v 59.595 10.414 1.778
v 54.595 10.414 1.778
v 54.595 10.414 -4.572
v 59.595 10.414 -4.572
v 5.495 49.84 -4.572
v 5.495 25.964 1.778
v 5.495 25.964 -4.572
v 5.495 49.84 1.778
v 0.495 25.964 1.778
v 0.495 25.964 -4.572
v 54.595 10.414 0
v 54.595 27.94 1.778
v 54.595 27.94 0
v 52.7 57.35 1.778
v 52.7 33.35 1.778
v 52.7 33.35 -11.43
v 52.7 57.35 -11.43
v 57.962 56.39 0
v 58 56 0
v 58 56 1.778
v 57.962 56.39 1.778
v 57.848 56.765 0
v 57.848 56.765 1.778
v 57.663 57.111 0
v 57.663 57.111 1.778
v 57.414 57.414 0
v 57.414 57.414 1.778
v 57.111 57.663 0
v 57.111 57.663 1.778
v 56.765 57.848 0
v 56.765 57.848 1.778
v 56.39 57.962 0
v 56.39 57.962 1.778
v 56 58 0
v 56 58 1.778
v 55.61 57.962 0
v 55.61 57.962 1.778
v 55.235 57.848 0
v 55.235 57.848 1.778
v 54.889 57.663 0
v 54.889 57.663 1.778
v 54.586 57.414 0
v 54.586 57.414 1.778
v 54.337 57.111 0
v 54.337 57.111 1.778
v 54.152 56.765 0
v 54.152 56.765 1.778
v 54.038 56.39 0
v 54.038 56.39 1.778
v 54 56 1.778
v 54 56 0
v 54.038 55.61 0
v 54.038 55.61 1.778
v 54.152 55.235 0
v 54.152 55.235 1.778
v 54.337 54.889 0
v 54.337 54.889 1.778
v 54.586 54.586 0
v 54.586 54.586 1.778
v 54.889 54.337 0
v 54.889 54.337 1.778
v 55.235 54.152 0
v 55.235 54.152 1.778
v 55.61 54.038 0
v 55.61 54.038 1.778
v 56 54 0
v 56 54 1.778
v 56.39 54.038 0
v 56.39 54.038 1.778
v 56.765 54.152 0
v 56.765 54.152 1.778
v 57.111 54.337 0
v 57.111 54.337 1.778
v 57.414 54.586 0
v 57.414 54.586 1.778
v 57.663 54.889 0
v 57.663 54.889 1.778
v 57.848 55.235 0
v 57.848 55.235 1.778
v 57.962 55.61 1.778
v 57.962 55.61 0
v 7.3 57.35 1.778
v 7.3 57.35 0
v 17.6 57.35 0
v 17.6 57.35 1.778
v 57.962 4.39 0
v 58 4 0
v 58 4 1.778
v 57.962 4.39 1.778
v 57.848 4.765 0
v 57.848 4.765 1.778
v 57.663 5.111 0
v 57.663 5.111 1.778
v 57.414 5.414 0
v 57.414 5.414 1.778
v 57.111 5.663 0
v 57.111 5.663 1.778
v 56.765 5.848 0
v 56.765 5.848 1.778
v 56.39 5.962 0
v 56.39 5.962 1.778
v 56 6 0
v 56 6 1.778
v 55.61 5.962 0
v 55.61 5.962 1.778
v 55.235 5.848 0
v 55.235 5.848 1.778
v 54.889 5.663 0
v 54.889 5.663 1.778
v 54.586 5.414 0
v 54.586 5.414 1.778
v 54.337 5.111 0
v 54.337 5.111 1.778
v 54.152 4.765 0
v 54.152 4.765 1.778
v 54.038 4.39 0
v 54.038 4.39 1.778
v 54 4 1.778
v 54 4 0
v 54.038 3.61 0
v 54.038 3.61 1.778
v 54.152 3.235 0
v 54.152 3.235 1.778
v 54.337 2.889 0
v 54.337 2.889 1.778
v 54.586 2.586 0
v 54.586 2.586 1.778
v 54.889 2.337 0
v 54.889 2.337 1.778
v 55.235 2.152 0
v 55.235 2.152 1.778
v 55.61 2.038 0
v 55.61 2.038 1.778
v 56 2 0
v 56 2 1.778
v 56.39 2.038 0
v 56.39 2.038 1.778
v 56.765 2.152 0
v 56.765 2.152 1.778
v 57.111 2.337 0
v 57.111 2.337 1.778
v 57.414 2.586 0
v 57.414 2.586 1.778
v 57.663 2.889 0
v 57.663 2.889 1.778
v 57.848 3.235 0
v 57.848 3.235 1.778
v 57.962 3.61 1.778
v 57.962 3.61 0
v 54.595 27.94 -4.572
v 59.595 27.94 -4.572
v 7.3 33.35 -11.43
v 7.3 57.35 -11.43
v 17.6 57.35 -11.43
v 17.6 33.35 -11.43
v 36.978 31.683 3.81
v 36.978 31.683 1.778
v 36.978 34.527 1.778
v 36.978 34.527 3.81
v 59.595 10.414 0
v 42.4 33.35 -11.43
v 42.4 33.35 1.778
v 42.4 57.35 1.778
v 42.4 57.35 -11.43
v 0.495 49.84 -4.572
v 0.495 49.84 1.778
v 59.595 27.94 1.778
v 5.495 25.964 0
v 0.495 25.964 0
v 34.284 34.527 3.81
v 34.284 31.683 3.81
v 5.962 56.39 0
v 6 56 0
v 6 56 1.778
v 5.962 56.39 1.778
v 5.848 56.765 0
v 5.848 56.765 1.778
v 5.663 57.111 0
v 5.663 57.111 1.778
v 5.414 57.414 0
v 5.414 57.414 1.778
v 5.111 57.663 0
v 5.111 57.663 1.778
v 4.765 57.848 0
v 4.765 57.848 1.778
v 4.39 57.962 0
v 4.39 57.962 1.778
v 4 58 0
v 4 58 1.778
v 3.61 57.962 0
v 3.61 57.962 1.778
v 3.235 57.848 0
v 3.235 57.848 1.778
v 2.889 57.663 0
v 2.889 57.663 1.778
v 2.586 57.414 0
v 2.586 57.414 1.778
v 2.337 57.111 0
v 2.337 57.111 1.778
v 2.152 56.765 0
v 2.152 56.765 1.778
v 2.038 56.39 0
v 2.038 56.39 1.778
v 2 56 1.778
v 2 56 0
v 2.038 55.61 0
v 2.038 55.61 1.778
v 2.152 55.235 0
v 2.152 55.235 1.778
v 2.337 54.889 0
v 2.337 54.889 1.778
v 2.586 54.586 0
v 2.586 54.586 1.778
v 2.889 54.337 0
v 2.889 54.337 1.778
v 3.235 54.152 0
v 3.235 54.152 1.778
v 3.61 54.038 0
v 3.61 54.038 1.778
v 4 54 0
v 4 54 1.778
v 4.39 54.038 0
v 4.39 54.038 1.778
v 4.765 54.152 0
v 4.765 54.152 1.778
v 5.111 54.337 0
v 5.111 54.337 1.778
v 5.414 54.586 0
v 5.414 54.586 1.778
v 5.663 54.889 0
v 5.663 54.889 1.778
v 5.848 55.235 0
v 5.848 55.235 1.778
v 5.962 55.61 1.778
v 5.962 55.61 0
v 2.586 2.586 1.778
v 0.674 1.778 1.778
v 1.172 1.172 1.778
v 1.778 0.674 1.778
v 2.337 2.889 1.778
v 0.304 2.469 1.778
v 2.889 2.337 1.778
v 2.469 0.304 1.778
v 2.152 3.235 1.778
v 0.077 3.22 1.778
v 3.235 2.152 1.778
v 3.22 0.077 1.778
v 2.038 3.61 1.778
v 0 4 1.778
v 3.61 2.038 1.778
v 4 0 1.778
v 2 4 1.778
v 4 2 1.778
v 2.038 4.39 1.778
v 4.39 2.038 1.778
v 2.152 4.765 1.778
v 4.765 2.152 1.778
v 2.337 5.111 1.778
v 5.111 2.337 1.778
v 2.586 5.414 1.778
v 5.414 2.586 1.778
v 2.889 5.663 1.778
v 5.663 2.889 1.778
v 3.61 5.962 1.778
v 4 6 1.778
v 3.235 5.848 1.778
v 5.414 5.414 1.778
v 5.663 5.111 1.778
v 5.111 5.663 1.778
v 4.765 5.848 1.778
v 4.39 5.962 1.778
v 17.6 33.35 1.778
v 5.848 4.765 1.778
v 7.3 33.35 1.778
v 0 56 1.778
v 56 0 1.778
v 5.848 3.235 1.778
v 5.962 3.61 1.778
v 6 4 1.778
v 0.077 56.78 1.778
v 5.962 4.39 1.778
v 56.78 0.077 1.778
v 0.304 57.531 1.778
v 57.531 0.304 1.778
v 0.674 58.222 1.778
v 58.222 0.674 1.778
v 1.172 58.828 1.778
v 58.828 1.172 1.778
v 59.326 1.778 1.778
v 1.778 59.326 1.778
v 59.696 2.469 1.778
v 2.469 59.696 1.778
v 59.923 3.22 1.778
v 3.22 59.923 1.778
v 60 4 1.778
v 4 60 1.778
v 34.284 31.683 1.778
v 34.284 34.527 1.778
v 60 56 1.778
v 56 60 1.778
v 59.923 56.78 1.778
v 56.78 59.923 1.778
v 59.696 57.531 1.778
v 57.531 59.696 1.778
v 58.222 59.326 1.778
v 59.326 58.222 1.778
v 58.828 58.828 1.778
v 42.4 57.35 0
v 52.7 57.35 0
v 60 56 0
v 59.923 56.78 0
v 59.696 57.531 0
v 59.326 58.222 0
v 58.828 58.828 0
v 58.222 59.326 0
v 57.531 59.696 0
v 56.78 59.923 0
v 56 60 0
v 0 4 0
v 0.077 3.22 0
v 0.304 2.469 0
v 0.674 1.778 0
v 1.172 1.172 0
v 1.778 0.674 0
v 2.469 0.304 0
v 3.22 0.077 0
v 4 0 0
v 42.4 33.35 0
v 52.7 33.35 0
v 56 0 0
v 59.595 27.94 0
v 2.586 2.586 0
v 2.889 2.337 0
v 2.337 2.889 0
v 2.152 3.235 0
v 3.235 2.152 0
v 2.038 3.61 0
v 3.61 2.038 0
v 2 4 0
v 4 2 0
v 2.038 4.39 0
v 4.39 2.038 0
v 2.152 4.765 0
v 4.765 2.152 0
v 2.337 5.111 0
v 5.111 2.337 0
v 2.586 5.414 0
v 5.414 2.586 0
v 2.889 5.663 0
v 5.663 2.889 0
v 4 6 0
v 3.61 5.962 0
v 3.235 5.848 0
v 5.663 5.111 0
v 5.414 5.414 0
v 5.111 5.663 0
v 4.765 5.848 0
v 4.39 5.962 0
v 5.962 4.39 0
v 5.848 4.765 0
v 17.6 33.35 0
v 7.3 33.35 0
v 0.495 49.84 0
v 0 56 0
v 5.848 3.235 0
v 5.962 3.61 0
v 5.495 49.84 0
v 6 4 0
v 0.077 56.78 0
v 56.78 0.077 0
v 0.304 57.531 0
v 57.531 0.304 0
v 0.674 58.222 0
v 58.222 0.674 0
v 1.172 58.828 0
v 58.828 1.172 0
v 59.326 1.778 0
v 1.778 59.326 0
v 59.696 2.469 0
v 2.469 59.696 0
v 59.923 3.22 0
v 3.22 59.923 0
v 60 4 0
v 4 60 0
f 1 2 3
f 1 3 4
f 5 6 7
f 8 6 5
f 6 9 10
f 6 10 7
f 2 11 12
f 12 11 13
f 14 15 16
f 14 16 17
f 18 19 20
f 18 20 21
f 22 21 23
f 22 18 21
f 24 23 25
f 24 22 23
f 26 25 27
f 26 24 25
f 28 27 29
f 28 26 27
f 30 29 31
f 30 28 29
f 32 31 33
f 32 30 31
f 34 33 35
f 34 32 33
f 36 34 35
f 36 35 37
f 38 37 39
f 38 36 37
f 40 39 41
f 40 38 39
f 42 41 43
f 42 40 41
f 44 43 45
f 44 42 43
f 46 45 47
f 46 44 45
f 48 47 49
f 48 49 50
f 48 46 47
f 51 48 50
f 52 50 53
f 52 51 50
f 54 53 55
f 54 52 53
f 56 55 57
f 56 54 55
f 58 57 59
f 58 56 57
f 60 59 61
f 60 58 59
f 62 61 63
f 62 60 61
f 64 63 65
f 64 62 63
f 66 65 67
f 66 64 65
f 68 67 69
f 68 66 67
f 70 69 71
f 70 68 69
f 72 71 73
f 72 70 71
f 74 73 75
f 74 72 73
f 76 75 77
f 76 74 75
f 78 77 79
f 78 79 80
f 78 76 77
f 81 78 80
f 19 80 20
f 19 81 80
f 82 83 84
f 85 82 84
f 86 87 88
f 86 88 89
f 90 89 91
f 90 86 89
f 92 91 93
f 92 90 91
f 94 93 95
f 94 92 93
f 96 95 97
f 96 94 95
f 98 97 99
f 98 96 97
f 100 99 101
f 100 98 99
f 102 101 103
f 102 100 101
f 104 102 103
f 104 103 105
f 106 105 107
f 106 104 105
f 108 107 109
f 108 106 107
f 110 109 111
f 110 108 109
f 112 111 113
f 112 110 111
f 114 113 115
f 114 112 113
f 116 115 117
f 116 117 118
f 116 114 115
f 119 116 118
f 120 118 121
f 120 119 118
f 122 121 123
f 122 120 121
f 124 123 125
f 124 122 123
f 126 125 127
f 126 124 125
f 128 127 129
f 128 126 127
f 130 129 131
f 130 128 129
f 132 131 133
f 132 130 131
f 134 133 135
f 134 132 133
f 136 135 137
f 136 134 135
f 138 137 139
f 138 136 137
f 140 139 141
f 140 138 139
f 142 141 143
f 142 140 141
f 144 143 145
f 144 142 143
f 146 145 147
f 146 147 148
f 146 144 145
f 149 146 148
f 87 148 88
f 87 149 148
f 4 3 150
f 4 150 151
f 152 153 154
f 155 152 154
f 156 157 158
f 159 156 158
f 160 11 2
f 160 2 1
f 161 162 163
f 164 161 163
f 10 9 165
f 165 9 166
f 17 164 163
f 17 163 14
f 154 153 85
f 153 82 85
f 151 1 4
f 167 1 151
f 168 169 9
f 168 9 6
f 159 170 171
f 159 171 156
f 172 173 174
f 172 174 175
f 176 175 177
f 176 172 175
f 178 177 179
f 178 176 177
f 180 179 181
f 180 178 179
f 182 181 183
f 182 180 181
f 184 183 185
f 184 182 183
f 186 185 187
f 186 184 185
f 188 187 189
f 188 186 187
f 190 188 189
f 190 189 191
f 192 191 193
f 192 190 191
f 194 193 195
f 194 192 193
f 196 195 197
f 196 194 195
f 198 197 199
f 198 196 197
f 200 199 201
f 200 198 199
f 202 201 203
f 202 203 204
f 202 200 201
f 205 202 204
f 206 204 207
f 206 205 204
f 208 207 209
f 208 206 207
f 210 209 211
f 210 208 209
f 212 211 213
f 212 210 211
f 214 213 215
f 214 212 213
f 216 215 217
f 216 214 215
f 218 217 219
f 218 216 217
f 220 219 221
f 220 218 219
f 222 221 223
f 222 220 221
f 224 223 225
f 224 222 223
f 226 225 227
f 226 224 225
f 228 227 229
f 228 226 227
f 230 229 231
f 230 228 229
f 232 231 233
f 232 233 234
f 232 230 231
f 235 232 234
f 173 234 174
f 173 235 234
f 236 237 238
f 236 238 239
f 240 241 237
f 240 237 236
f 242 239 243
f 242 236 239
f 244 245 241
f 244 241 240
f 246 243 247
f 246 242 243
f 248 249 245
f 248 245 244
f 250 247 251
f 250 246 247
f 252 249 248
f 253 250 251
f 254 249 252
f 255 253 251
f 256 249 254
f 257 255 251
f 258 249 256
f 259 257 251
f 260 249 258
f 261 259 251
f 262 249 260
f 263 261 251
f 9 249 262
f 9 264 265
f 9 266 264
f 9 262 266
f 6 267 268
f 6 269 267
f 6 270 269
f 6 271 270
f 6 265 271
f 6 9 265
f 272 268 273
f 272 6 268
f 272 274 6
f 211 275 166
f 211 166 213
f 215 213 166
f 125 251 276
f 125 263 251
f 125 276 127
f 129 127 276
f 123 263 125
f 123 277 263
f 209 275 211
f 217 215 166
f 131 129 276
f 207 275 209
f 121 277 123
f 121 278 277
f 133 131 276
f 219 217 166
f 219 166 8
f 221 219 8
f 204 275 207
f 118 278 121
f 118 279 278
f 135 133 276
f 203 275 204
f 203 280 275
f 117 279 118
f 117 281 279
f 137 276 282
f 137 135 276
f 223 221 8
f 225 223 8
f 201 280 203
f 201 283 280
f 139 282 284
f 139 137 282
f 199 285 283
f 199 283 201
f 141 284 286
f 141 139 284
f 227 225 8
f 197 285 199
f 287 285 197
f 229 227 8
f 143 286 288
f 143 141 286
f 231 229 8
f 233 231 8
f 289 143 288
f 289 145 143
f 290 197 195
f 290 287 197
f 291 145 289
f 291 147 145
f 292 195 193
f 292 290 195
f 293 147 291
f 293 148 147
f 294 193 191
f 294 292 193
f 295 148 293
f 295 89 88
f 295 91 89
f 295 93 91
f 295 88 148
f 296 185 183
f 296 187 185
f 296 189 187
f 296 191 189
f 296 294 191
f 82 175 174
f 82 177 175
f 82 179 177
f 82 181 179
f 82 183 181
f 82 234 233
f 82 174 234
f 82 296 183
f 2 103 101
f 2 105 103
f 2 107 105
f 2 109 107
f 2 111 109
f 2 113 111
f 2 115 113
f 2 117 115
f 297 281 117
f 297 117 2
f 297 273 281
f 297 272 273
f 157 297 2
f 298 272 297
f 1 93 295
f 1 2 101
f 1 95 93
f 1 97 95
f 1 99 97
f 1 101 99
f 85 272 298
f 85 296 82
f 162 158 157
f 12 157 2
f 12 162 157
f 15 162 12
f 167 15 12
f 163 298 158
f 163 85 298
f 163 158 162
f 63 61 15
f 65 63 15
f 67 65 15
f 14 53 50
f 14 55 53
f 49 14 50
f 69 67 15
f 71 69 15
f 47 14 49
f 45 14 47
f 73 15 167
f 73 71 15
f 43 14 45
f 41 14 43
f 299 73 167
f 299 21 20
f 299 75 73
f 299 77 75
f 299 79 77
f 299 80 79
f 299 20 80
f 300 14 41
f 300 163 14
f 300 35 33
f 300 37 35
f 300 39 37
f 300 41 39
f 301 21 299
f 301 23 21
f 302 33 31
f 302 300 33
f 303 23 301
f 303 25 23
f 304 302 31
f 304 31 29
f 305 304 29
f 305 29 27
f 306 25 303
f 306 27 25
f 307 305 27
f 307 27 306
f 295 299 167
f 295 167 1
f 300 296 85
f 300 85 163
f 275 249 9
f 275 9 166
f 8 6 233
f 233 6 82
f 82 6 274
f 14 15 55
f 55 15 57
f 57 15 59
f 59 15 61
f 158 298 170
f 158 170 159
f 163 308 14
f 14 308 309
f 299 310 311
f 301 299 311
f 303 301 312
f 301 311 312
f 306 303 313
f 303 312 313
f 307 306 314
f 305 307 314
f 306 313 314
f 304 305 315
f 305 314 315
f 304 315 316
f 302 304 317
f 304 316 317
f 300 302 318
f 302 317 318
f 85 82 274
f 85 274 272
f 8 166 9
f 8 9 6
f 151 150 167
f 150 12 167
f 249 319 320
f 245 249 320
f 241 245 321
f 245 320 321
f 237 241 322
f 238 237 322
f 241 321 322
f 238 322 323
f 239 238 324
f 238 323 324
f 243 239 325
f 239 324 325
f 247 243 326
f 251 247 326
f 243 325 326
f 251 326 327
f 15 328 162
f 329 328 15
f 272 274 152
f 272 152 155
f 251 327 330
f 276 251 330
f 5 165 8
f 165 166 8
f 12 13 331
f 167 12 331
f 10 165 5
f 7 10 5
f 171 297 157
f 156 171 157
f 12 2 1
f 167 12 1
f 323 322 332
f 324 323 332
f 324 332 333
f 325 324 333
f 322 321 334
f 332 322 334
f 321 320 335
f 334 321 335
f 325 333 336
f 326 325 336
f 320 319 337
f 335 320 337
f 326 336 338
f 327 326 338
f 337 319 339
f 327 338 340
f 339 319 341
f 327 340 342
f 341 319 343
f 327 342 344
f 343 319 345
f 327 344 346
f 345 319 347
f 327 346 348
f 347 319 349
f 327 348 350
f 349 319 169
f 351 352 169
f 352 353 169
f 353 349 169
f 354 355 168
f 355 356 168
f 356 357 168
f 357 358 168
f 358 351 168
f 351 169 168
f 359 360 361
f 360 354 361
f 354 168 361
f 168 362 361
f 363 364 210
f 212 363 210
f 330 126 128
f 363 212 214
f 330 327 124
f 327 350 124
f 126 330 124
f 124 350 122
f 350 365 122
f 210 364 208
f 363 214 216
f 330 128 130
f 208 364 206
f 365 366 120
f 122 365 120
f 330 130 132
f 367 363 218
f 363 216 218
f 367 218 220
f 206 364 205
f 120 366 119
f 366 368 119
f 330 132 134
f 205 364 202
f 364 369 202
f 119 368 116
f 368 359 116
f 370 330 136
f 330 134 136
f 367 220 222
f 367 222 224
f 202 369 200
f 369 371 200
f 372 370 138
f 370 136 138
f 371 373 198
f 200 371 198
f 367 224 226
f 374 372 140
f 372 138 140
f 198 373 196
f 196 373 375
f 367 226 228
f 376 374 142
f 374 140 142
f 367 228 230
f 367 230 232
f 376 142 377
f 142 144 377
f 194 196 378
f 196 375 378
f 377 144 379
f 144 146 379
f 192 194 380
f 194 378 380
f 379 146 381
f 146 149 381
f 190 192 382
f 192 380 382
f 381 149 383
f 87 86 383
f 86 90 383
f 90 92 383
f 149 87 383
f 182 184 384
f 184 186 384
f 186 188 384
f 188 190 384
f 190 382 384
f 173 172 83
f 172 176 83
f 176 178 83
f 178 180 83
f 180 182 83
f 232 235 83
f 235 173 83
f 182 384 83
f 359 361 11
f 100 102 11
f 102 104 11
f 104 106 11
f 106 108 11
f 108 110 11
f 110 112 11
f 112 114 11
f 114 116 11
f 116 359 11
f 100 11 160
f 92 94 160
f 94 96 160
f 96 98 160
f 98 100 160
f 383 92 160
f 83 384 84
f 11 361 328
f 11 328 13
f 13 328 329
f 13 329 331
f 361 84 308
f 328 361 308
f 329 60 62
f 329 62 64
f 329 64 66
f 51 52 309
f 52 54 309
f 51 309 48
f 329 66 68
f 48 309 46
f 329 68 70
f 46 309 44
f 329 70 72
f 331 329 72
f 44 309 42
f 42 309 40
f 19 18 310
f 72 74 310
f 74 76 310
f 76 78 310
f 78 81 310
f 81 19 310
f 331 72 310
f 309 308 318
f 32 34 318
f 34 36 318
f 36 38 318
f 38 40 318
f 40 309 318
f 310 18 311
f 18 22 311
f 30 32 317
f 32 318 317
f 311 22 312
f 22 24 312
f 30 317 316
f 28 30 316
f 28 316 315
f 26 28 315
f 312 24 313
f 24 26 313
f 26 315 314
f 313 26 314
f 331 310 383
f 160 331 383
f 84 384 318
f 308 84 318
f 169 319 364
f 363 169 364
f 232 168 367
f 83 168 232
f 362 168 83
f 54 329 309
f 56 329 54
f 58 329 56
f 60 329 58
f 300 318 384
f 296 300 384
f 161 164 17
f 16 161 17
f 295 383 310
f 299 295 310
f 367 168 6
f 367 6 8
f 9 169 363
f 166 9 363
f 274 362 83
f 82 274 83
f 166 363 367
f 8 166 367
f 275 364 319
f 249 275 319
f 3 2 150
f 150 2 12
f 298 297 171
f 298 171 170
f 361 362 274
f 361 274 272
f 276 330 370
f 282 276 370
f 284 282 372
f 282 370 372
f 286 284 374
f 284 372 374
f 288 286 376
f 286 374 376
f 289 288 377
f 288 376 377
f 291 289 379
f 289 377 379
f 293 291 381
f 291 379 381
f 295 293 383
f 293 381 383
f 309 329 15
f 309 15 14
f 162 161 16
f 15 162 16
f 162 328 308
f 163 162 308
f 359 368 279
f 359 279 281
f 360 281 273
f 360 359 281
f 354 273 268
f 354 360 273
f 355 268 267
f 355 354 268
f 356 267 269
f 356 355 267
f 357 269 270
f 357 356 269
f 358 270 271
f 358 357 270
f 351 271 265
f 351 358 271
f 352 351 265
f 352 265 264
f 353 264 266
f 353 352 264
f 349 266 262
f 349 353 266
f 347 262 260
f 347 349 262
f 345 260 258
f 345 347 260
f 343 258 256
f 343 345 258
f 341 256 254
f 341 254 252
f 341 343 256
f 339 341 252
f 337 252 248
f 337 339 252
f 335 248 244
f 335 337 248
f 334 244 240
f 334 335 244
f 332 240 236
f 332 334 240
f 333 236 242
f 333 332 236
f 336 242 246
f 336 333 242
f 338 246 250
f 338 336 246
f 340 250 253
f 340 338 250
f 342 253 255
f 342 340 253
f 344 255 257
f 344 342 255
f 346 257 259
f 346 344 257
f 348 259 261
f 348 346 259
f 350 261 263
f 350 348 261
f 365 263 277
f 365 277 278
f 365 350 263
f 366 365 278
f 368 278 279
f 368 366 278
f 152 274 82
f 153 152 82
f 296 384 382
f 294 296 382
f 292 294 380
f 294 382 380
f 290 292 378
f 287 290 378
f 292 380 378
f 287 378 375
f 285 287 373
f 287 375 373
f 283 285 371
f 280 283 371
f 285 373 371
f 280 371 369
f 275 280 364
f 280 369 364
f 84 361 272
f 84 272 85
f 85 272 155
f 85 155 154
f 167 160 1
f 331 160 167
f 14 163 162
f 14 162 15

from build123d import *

# Parameters (mm, degrees)
SKETCH1_R                  = 2
SKETCH1_W                  = 5
SKETCH1_H                  = 17.526
SKETCH1_H_2                = 23.876
SKETCH1_W_2                = 10.3
SKETCH1_H_3                = 24
SKETCH1_W_3                = 2.693412003
SKETCH1_H_4                = 2.844097509
BOSS_EXTRUDE1_DEPTH        = 1.778
SKETCH1_3_W                = 10.3
SKETCH1_3_H                = 24
BOSS_EXTRUDE2_DEPTH        = 1.778
BOSS_EXTRUDE2_DEPTH_BACK   = 11.43
BOSS_EXTRUDE2_2_DEPTH      = 1.778
BOSS_EXTRUDE2_2_DEPTH_BACK = 11.43
SKETCH1_4_W                = 5
SKETCH1_4_H                = 17.526
BOSS_EXTRUDE3_DEPTH        = 1.778
BOSS_EXTRUDE3_DEPTH_BACK   = 4.572
SKETCH1_4_H_2              = 23.876
BOSS_EXTRUDE3_2_DEPTH      = 1.778
BOSS_EXTRUDE3_2_DEPTH_BACK = 4.572
SKETCH1_5_W                = 2.693412003
SKETCH1_5_H                = 2.844097509
BOSS_EXTRUDE5_DEPTH        = 3.81


with BuildPart() as part:
    # Sketch1 → Boss-Extrude1 (new body)
    with BuildSketch(Plane.XY):
        with BuildLine():
            ThreePointArc((0, 4), (1.171572875, 1.171572875), (4, 0))
            Line((4, 0), (56, 0))
            ThreePointArc((56, 0), (58.828427125, 1.171572875), (60, 4))
            Line((60, 4), (60, 56))
            ThreePointArc((60, 56), (58.828427125, 58.828427125), (56, 60))
            Line((56, 60), (4, 60))
            ThreePointArc((4, 60), (1.171572875, 58.828427125), (0, 56))
            Line((0, 56), (0, 4))
        make_face()
        with Locations((4, 4)):
            Circle(SKETCH1_R, mode=Mode.SUBTRACT)
        with Locations((56, 4)):
            Circle(SKETCH1_R, mode=Mode.SUBTRACT)
        with Locations((57.095415437, 19.177)):
            Rectangle(SKETCH1_W, SKETCH1_H, mode=Mode.SUBTRACT)
        with Locations((2.994822902, 37.902)):
            Rectangle(SKETCH1_W, SKETCH1_H_2, mode=Mode.SUBTRACT)
        with Locations((12.45, 45.35)):
            Rectangle(SKETCH1_W_2, SKETCH1_H_3, mode=Mode.SUBTRACT)
        with Locations((4, 56)):
            Circle(SKETCH1_R, mode=Mode.SUBTRACT)
        with Locations((35.630798564, 33.105263678)):
            Rectangle(SKETCH1_W_3, SKETCH1_H_4, mode=Mode.SUBTRACT)
        with Locations((47.55, 45.35)):
            Rectangle(SKETCH1_W_2, SKETCH1_H_3, mode=Mode.SUBTRACT)
        with Locations((56, 56)):
            Circle(SKETCH1_R, mode=Mode.SUBTRACT)
    extrude(amount=BOSS_EXTRUDE1_DEPTH)

    # Sketch1<5> → Boss-Extrude5 (add)
    with BuildSketch(Plane.XY):
        with Locations((35.630798564, 33.105263678)):
            Rectangle(SKETCH1_5_W, SKETCH1_5_H)
    extrude(amount=BOSS_EXTRUDE5_DEPTH)


with BuildPart() as body_2:
    # Sketch1<3> → Boss-Extrude2 (new body, two sides)
    with BuildSketch(Plane.XY) as boss_extrude2_sk:
        with Locations((47.55, 45.35)):
            Rectangle(SKETCH1_3_W, SKETCH1_3_H)
    extrude(amount=BOSS_EXTRUDE2_DEPTH)
    extrude(boss_extrude2_sk.sketch, amount=-BOSS_EXTRUDE2_DEPTH_BACK)


with BuildPart() as body_3:
    # Sketch1<3> → Boss-Extrude2 2 (new body, two sides)
    with BuildSketch(Plane.XY) as boss_extrude2_2_sk:
        with Locations((12.45, 45.35)):
            Rectangle(SKETCH1_3_W, SKETCH1_3_H)
    extrude(amount=BOSS_EXTRUDE2_2_DEPTH)
    extrude(boss_extrude2_2_sk.sketch, amount=-BOSS_EXTRUDE2_2_DEPTH_BACK)


with BuildPart() as body_4:
    # Sketch1<4> → Boss-Extrude3 (new body, two sides)
    with BuildSketch(Plane.XY) as boss_extrude3_sk:
        with Locations((57.095415437, 19.177)):
            Rectangle(SKETCH1_4_W, SKETCH1_4_H)
    extrude(amount=BOSS_EXTRUDE3_DEPTH)
    extrude(boss_extrude3_sk.sketch, amount=-BOSS_EXTRUDE3_DEPTH_BACK)


with BuildPart() as body_5:
    # Sketch1<4> → Boss-Extrude3 2 (new body, two sides)
    with BuildSketch(Plane.XY) as boss_extrude3_2_sk:
        with Locations((2.994822902, 37.902)):
            Rectangle(SKETCH1_4_W, SKETCH1_4_H_2)
    extrude(amount=BOSS_EXTRUDE3_2_DEPTH)
    extrude(boss_extrude3_2_sk.sketch, amount=-BOSS_EXTRUDE3_2_DEPTH_BACK)


solid = Compound([part.part, body_2.part, body_3.part, body_4.part, body_5.part])
